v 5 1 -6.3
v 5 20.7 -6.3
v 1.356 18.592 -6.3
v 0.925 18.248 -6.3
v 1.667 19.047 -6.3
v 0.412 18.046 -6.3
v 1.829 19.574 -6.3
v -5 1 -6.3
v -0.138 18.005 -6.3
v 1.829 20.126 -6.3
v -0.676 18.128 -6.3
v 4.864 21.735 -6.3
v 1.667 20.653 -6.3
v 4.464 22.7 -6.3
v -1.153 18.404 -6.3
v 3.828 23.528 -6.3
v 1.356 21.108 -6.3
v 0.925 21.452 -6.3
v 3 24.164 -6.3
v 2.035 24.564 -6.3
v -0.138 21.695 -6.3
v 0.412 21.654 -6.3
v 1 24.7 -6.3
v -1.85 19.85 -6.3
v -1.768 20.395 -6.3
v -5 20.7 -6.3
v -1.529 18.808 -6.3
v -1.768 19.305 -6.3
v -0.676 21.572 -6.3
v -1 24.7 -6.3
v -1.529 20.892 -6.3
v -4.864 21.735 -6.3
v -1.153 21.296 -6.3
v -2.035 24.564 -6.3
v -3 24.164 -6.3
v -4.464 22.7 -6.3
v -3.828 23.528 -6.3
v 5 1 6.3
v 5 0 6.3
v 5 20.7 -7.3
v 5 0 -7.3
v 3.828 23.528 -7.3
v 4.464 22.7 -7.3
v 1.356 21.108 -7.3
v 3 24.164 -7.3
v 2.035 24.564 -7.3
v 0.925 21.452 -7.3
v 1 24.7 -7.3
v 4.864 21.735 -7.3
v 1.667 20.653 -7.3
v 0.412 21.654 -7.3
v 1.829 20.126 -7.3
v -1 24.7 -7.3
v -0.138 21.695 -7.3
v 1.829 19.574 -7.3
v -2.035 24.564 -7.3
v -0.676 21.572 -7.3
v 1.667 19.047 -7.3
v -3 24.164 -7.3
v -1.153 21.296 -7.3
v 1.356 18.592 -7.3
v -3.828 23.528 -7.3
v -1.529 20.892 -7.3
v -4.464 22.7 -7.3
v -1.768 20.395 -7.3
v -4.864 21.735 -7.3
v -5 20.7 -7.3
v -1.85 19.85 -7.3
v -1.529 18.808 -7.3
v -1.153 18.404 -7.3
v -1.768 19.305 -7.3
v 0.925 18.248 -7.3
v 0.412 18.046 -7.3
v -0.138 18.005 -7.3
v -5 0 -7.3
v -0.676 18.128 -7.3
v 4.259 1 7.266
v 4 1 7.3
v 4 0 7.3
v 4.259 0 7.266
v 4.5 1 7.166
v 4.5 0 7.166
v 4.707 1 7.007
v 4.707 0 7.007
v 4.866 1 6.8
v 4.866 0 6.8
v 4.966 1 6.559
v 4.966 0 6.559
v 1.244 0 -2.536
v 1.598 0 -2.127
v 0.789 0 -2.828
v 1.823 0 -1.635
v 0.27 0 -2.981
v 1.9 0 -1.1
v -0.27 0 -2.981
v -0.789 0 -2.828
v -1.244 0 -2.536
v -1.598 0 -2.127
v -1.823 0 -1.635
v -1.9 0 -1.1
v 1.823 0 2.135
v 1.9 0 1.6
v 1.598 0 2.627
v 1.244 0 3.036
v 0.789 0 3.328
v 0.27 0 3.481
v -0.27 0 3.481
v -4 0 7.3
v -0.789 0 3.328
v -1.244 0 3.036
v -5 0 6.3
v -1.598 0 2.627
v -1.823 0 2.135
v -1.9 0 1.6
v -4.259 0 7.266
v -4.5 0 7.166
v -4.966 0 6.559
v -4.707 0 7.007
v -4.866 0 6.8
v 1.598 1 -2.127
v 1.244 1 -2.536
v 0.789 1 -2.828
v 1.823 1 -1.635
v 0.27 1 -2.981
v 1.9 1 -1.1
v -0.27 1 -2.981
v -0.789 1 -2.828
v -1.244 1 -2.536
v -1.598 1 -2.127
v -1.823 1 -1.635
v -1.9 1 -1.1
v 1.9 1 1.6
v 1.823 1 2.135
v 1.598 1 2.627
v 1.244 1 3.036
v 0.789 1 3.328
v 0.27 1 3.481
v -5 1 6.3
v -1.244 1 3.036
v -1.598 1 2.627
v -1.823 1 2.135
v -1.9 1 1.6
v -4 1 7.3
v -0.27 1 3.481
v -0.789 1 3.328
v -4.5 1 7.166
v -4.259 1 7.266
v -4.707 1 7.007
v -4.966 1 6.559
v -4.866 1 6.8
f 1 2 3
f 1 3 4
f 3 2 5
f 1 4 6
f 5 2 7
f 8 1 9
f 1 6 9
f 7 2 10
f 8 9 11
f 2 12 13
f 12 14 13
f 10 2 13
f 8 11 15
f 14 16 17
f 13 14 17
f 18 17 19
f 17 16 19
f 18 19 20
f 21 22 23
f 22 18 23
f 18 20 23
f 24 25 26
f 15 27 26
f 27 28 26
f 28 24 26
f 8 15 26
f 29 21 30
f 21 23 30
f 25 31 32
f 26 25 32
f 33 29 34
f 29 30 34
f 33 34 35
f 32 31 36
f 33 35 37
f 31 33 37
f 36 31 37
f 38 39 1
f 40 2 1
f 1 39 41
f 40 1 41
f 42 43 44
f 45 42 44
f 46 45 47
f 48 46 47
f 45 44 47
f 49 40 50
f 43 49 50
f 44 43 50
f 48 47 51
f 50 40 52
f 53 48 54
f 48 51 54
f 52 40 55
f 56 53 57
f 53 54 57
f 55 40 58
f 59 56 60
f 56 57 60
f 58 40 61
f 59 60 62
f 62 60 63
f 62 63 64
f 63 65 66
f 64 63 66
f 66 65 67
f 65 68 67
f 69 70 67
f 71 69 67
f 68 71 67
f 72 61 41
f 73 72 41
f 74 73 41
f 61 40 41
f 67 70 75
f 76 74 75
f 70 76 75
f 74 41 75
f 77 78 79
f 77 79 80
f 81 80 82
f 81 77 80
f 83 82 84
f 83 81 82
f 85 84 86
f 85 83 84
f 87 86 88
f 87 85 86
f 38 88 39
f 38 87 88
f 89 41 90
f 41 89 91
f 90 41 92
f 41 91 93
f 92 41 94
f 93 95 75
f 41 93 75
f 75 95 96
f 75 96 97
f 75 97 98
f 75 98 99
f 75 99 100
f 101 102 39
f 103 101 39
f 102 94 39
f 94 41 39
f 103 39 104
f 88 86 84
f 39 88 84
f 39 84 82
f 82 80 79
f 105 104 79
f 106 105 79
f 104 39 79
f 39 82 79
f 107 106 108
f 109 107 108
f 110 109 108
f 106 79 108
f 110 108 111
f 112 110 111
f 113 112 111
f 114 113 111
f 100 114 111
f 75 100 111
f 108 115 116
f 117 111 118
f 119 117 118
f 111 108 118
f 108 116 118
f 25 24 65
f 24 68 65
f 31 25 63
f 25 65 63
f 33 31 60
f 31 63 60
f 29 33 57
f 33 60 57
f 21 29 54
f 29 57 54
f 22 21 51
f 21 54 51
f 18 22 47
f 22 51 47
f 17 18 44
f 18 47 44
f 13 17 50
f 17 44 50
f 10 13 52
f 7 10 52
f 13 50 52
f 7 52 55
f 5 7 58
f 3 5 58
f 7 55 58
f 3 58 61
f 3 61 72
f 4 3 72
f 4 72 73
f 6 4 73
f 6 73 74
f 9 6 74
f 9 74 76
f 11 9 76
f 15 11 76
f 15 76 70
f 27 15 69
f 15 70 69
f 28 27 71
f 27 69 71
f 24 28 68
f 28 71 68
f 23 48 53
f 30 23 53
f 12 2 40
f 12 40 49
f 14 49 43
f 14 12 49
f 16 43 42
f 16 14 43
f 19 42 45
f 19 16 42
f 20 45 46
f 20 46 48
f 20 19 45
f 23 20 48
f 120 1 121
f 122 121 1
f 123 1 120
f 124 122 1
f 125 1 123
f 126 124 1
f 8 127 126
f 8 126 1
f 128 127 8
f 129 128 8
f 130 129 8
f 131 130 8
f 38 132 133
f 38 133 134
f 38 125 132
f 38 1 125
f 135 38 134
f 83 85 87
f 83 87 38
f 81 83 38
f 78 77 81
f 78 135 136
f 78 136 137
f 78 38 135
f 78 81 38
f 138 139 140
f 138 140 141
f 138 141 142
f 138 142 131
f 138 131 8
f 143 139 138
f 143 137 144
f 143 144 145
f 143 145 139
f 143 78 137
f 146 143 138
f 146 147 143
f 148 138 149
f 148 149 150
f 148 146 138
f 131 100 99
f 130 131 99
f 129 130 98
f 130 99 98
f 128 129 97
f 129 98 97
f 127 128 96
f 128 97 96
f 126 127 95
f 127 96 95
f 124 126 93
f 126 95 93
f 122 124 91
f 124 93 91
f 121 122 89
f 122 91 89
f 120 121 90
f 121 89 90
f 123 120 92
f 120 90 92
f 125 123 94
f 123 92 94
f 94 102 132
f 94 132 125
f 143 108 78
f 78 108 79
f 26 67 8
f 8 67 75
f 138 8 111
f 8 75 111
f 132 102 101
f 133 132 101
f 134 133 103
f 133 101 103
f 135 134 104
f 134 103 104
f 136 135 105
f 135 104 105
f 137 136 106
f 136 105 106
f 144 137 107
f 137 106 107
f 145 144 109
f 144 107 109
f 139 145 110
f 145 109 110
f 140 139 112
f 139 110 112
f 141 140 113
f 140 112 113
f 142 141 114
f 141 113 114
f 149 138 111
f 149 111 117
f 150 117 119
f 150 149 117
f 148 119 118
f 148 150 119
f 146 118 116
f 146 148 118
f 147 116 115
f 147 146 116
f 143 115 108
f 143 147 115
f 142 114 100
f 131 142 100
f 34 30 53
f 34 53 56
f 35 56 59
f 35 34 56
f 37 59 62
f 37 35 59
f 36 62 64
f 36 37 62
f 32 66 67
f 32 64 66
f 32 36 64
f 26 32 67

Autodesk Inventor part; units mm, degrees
ref_plane "YZ Plane" through (0, 0, 0) normal (1, 0, 0) x (0, 1, 0)
ref_plane "XZ Plane" through (0, 0, 0) normal (0, 1, 0) x (-1, 0, 0)
ref_plane "XY Plane" through (0, 0, 0) normal (0, 0, 1) x (1, 0, 0)
sketch "Sketch1" plane through (0, 0, 0) normal (0, 1, 0) x (-1, 0, 0)
  line L0 (5, 7.3) -> (-5, 7.3)
  line L1 (-5, 7.3) -> (-5, -7.3)
  line L2 (-5, -7.3) -> (5, -7.3)
  line L3 (5, -7.3) -> (5, 7.3)
  line L4 (5, 7.3) -> (-5, -7.3) construction
  line L5 (-5, 7.3) -> (5, -7.3) construction
  point P0 (0, 0)
  dimension "d0" = 10
  dimension "d1" = 14.6
extrude "Extrusion1" add sketch "Sketch1" along normal blind 1
sketch "Sketch2" plane through (5, 0, -7.3) normal (0, 0, -1) x (-1, 0, 0)
  line L0 (10, 0) -> (0, 0) projected
  line L1 (0, 0) -> (0, 24.7)
  line L2 (0, 24.7) -> (10, 24.7)
  line L3 (10, 24.7) -> (10, 0)
  point P0 (5, 0)
  dimension "d4" = 24.7
extrude "Extrusion2" add sketch "Sketch2" against normal blind 1
fillet "Fillet1" radius 4 2 edges at (5, 24.7, -6.8) (-5, 24.7, -6.8)
fillet "Fillet2" radius 1 2 edges at (-5, 0.5, 7.3) (5, 0.5, 7.3)
sketch "Sketch3" plane through (5, 0, -7.3) normal (0, 0, -1) x (-1, 0, 0)
  circle A0 centre (5, 19.85) radius 1.85
  line L0 (0, 0) -> (0, 20.7) projected
  line L1 (5, 21.7) -> (6.6441, 21.7) construction
  line L2 (4, 24.7) -> (6, 24.7) construction
  point P0 (5, 0)
  dimension "d9" = 3.7
  dimension "d10" = 5
  dimension "d11" = 3
extrude "Extrusion3" cut sketch "Sketch3" against normal blind 1
sketch "Sketch4" plane through (0, 0, 0) normal (0, -1, 0) x (1, 0, 0)
  arc A0 (1.9, 1.6) -> (-1.9, 1.6) centre (0, 1.6) ccw
  line L0 (-5, -7.3) -> (-5, 6.3) projected
  line L1 (-4, 7.3) -> (4, 7.3) construction
  line L2 (0, 3.5) -> (1.9, 3.5) construction
  arc A1 (-1.9, -1.1) -> (1.9, -1.1) centre (0, -1.1) ccw
  line L3 (0, -3) -> (1.9, -3) construction
  line L4 (1.9, 1.6) -> (1.9, -1.1)
  line L5 (-1.9, 1.6) -> (-1.9, -1.1)
  point P0 (0, 0)
  dimension "d14" = 3.8
  dimension "d15" = 5
  dimension "d17" = 3.8
  dimension "d18" = 3.8
  dimension "d19" = 6.5
  dimension "d20" = 5
extrude "Extrusion4" cut sketch "Sketch4" against normal blind 1
properties part number "Angle bracket long"
